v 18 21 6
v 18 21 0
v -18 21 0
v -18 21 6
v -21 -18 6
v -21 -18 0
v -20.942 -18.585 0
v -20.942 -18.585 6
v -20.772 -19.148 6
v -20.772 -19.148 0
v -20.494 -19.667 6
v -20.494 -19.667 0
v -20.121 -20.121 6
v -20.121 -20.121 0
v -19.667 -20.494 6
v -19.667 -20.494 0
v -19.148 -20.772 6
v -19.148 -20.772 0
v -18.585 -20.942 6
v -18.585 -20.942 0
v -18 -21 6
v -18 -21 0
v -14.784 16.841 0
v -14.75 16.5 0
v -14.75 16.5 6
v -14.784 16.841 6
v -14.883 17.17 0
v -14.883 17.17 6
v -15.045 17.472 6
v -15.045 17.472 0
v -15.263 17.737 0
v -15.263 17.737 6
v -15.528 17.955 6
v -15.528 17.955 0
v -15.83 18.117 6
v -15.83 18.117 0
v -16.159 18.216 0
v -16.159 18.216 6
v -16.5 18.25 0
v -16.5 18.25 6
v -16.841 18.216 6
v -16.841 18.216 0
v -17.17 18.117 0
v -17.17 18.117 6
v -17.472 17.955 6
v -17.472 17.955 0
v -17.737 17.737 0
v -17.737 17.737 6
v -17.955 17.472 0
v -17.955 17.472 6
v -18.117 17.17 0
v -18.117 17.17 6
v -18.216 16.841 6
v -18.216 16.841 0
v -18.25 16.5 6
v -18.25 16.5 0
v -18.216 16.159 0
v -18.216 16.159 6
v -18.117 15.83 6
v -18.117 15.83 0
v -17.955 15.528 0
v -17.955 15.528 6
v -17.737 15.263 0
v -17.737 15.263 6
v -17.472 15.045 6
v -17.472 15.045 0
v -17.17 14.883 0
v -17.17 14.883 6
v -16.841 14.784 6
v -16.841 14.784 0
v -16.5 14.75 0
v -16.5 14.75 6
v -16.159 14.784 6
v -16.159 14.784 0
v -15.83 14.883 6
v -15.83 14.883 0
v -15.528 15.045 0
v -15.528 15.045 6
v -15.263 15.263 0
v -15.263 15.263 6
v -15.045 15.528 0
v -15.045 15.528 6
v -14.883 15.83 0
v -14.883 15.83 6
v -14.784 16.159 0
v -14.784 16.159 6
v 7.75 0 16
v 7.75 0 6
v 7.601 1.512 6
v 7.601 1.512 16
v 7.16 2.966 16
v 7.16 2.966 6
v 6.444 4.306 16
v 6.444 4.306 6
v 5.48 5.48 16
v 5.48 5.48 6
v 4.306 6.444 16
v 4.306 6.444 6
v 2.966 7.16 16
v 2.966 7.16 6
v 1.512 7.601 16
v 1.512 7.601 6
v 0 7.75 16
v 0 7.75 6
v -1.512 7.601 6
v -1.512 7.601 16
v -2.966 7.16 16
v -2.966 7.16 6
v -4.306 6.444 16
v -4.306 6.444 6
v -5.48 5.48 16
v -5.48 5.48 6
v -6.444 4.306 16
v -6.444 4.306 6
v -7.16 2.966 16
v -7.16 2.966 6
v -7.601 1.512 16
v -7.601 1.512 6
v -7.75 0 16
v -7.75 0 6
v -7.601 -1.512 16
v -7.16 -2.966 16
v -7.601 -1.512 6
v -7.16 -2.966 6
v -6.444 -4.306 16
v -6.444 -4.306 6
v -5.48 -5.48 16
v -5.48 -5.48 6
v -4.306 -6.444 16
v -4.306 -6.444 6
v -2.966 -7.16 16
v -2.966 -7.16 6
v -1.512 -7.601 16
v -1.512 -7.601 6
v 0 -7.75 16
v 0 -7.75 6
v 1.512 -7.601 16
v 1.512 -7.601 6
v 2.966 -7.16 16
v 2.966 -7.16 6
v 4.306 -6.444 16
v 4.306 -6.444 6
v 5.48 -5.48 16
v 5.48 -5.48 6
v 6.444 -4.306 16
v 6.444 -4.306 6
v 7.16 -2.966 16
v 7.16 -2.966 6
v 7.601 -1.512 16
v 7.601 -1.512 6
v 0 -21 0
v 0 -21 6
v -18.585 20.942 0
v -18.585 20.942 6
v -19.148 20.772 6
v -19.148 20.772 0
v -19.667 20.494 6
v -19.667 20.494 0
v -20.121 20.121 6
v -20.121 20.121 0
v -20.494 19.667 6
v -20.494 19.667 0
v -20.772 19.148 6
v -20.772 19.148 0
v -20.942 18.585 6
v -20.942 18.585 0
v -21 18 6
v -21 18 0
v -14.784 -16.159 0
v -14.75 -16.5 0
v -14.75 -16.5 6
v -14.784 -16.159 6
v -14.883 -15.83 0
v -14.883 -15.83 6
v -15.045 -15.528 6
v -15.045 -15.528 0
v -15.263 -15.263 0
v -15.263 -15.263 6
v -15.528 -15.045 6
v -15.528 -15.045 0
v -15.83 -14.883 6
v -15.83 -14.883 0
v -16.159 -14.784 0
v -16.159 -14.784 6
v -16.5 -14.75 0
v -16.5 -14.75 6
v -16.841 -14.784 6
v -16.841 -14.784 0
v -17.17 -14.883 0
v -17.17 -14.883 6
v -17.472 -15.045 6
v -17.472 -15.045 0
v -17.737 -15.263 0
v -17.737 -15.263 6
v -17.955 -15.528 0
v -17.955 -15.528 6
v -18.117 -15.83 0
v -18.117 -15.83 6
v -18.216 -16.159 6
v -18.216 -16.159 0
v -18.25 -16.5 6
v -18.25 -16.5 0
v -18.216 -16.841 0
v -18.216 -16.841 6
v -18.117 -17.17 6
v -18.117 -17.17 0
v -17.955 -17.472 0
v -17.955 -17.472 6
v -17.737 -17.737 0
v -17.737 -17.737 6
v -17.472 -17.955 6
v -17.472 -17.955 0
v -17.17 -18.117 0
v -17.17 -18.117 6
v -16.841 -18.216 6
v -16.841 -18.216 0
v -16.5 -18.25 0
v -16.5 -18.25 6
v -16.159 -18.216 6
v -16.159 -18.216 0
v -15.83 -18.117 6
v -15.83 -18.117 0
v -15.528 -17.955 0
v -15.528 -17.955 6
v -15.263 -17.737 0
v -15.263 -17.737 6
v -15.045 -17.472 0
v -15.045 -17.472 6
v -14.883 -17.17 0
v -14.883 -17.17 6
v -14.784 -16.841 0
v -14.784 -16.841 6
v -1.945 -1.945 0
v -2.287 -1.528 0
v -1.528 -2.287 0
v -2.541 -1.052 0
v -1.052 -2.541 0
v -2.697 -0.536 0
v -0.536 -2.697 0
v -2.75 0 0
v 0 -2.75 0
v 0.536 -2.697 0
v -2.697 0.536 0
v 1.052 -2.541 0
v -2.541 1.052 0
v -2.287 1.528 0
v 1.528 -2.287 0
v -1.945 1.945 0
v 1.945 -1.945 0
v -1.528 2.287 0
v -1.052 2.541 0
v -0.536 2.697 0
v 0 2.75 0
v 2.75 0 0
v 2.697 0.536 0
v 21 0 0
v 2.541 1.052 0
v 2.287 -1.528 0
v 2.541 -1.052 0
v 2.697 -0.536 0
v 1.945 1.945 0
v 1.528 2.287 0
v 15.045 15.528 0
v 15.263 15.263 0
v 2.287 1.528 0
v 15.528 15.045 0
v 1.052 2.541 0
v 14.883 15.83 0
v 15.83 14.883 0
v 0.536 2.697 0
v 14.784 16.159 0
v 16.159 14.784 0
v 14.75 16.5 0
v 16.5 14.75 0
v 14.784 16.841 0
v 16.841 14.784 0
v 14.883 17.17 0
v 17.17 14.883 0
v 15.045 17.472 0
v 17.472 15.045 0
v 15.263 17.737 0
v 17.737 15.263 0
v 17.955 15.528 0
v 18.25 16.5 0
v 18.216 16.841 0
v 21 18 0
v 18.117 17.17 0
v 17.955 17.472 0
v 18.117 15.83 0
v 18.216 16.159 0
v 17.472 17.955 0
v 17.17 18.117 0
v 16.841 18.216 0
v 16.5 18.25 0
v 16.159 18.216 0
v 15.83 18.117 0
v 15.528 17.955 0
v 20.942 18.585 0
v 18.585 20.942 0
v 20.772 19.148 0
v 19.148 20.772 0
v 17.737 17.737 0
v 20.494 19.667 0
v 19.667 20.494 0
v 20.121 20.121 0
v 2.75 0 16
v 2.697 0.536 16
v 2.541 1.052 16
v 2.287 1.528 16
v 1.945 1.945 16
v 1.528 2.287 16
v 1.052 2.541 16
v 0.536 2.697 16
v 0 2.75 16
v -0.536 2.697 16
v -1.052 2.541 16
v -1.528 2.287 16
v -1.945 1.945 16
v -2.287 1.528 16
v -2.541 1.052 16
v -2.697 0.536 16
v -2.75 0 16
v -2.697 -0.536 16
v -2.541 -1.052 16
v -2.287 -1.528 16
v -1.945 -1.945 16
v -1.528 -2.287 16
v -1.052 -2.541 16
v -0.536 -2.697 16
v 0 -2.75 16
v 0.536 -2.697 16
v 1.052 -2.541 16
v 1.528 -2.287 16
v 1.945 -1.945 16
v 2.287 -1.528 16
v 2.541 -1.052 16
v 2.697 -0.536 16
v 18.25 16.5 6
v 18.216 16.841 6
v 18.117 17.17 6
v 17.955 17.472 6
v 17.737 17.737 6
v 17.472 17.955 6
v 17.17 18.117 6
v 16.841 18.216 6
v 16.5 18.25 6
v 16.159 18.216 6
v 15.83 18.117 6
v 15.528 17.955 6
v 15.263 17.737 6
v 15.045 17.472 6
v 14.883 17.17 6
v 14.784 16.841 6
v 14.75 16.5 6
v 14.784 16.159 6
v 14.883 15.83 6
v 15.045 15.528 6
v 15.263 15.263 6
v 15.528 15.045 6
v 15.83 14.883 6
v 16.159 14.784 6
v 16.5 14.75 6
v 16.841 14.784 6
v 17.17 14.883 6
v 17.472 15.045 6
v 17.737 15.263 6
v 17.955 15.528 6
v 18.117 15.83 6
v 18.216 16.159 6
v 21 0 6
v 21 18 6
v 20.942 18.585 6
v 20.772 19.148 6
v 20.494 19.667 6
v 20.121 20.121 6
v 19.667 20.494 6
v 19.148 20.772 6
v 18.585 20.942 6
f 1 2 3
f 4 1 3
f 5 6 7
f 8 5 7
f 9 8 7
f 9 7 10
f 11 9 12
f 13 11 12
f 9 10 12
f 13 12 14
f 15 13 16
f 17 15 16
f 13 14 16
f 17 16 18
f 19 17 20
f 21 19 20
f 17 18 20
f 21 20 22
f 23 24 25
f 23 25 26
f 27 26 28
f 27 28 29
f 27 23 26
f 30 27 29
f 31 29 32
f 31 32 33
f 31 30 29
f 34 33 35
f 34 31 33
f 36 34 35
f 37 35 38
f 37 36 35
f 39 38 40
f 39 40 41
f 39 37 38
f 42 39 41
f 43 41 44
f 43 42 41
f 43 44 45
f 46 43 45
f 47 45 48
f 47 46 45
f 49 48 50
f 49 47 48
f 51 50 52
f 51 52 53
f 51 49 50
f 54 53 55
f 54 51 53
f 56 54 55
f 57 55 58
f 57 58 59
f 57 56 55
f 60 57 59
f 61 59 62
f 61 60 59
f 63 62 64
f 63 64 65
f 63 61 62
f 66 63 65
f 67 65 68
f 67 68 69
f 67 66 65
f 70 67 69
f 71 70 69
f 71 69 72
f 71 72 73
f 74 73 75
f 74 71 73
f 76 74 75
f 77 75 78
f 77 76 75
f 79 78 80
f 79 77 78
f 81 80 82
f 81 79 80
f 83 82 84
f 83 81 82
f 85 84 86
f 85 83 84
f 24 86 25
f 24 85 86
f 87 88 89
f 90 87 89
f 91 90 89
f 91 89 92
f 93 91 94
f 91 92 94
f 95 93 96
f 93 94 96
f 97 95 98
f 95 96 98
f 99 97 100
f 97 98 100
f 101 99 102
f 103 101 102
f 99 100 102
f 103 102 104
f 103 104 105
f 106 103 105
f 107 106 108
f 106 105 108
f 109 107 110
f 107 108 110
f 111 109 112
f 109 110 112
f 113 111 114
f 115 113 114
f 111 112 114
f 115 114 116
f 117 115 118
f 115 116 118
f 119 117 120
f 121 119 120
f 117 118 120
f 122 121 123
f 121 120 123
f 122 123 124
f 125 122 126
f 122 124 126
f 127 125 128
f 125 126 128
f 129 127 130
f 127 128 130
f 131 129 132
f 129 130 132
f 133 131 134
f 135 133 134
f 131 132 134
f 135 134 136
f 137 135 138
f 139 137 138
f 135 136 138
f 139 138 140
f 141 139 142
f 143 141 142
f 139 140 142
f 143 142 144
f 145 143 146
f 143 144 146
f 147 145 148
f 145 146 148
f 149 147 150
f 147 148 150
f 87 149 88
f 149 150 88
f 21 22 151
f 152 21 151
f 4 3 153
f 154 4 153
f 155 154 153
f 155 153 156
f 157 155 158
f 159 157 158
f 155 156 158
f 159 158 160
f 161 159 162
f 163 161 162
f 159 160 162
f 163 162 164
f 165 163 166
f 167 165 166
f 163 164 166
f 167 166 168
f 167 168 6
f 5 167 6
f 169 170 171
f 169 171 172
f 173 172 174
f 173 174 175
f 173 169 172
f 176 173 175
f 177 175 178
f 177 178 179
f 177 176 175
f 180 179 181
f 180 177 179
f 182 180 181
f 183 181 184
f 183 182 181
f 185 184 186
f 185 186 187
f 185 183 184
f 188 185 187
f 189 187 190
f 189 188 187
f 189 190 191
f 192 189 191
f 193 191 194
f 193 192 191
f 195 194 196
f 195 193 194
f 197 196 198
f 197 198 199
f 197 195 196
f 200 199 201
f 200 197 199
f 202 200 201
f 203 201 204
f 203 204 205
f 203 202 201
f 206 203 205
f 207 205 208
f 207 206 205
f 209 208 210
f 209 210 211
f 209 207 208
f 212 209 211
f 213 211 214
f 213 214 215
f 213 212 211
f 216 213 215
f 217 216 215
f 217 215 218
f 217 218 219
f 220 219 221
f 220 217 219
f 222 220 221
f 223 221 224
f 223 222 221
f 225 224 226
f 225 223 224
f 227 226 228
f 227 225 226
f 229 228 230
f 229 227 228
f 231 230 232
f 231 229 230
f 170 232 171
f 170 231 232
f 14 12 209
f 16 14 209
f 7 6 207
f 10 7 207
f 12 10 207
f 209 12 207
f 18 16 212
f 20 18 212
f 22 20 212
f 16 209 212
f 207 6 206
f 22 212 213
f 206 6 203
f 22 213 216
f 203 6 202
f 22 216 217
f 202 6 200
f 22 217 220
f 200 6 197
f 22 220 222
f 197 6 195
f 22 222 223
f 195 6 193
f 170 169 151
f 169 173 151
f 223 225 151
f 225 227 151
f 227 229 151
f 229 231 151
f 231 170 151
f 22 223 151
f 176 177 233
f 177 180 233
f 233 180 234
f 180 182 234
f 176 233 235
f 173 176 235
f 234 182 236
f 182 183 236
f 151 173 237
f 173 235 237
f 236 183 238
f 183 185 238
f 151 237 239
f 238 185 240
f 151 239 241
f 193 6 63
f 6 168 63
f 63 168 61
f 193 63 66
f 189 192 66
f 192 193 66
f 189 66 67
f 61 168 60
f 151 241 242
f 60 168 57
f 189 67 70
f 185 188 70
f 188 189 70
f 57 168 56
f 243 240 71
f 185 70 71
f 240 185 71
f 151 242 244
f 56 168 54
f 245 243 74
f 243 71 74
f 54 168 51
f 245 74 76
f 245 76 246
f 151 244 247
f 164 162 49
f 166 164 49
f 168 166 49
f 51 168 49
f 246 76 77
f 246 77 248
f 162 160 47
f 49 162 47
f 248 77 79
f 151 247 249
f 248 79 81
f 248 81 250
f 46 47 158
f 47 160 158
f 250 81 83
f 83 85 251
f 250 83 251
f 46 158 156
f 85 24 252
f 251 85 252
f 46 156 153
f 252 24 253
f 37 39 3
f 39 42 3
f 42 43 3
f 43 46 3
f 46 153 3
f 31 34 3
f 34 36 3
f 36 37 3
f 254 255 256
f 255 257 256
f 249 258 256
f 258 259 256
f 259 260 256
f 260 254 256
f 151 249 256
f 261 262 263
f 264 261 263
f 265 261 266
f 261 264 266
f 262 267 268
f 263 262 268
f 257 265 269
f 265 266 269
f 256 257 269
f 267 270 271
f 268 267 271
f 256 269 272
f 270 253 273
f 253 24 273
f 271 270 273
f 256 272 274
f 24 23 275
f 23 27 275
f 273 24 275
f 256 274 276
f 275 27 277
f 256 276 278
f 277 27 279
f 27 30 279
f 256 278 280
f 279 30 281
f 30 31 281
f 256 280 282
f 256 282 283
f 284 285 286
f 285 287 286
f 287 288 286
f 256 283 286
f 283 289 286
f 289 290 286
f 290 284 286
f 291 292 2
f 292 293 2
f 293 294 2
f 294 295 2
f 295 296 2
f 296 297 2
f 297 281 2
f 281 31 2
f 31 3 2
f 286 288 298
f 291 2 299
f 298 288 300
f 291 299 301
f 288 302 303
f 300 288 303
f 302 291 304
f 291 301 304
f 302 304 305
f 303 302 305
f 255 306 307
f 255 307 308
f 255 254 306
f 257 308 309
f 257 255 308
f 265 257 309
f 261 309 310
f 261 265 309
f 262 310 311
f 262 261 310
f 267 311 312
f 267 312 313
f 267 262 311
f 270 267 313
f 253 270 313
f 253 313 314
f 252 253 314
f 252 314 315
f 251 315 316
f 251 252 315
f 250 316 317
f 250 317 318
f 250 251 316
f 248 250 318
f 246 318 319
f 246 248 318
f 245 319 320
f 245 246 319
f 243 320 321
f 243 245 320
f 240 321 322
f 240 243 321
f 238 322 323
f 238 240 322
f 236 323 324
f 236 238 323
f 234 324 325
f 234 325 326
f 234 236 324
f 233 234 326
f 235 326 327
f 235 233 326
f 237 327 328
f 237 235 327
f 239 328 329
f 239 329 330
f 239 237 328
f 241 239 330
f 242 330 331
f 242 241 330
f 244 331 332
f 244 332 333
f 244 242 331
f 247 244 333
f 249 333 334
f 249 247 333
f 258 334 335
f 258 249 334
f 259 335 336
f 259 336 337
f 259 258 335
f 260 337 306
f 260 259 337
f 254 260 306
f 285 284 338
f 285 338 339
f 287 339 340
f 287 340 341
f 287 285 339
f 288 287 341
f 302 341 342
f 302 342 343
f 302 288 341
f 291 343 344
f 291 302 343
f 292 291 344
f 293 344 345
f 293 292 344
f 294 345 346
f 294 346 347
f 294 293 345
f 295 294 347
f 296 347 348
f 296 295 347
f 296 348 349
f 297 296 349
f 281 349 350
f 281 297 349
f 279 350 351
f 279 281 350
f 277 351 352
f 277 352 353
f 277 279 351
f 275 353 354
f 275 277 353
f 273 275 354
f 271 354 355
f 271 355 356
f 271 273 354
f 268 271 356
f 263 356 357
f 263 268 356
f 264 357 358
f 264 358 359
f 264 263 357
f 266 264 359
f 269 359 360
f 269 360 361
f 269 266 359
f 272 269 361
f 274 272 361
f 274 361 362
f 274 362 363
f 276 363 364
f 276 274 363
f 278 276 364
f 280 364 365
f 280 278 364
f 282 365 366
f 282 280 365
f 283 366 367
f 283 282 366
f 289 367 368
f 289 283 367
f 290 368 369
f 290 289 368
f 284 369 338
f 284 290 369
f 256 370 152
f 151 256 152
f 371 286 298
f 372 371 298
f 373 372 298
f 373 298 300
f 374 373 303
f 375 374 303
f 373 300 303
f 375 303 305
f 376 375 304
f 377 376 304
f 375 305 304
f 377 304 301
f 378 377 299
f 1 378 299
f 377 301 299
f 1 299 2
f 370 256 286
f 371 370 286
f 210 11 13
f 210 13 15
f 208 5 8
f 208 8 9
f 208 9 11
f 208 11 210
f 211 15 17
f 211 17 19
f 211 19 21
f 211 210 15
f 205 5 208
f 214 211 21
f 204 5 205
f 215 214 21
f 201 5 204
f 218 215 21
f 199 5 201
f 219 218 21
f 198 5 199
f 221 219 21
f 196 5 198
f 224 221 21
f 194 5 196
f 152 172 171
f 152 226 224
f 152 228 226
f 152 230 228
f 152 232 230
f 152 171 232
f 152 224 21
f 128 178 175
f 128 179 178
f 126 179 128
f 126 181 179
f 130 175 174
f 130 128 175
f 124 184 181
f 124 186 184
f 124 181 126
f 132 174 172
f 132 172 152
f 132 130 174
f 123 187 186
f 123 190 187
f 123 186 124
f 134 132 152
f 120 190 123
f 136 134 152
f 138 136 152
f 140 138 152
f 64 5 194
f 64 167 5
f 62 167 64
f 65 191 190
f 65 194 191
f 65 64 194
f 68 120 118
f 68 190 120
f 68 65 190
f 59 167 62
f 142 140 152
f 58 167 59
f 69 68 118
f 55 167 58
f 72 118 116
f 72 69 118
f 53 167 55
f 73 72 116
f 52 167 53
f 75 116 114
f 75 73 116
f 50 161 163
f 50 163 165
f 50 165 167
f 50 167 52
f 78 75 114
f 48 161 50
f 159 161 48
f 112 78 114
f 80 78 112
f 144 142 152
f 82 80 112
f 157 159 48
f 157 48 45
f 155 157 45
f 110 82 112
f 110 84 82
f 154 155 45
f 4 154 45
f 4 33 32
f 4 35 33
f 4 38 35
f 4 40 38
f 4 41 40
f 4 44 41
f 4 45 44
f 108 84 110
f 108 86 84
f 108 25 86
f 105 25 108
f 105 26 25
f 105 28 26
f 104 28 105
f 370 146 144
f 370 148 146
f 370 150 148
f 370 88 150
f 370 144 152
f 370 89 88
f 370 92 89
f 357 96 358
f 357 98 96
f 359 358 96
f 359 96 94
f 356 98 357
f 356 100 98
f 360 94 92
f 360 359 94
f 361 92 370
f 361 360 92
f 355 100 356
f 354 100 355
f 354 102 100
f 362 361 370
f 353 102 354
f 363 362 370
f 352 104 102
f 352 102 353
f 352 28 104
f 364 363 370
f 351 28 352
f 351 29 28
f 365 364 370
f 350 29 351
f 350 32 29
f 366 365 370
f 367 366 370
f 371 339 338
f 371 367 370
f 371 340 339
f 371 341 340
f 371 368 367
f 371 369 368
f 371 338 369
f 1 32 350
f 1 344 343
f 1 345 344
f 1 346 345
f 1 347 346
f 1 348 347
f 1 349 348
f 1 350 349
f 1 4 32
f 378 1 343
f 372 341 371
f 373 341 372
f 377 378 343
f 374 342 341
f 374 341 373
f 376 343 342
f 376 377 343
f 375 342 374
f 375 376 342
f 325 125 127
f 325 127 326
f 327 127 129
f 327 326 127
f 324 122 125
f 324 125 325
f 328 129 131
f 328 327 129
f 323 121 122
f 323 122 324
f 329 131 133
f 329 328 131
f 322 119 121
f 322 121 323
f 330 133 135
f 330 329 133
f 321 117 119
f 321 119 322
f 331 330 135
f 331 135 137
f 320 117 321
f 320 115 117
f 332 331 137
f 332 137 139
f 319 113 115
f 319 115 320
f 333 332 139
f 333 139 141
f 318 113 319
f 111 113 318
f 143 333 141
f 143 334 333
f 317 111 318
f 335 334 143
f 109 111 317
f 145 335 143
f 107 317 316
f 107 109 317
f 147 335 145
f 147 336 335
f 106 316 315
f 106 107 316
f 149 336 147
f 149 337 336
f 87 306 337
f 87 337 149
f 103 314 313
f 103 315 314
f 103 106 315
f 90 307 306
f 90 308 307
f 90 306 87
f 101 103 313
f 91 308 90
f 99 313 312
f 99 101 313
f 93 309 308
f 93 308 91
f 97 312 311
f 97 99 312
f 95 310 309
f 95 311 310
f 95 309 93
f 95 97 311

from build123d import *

# Parameters (mm, degrees)
F0_R     = 1.75
F0_R_2   = 2.75
F1_DEPTH = 6
F3_DEPTH = 25
F4_R     = 7.75
F4_R_2   = 2.75
F5_DEPTH = 10


with BuildPart() as f1:
    # F0 (on Top) → F1 (new body)
    with BuildSketch(Plane.XY):
        with BuildLine():
            ThreePointArc((21, 18), (20.12132, 20.12132), (18, 21))
            Line((18, 21), (-18, 21))
            ThreePointArc((-18, 21), (-20.12132, 20.12132), (-21, 18))
            Line((-21, 18), (-21, -18))
            ThreePointArc((-21, -18), (-20.12132, -20.12132), (-18, -21))
            Line((-18, -21), (18, -21))
            ThreePointArc((18, -21), (20.12132, -20.12132), (21, -18))
            Line((21, -18), (21, 18))
        make_face()
        with Locations((-16.5, -16.5)):
            Circle(F0_R, mode=Mode.SUBTRACT)
        with Locations((16.5, -16.5)):
            Circle(F0_R, mode=Mode.SUBTRACT)
        with Locations((-16.5, 16.5)):
            Circle(F0_R, mode=Mode.SUBTRACT)
        Circle(F0_R_2, mode=Mode.SUBTRACT)
        with Locations((16.5, 16.5)):
            Circle(F0_R, mode=Mode.SUBTRACT)
    extrude(amount=F1_DEPTH)

    # F2 (on face) → F3 (cut)
    with BuildSketch(Plane.XY.offset(6)):
        Polygon((21, 0), (0, -21), (21, -21), align=None)
    extrude(amount=-F3_DEPTH, mode=Mode.SUBTRACT)

    # F4 (on face) → F5 (join)
    with BuildSketch(Plane.XY.offset(6)):
        Circle(F4_R)
        Circle(F4_R_2, mode=Mode.SUBTRACT)
    extrude(amount=F5_DEPTH)


solid = f1.part
